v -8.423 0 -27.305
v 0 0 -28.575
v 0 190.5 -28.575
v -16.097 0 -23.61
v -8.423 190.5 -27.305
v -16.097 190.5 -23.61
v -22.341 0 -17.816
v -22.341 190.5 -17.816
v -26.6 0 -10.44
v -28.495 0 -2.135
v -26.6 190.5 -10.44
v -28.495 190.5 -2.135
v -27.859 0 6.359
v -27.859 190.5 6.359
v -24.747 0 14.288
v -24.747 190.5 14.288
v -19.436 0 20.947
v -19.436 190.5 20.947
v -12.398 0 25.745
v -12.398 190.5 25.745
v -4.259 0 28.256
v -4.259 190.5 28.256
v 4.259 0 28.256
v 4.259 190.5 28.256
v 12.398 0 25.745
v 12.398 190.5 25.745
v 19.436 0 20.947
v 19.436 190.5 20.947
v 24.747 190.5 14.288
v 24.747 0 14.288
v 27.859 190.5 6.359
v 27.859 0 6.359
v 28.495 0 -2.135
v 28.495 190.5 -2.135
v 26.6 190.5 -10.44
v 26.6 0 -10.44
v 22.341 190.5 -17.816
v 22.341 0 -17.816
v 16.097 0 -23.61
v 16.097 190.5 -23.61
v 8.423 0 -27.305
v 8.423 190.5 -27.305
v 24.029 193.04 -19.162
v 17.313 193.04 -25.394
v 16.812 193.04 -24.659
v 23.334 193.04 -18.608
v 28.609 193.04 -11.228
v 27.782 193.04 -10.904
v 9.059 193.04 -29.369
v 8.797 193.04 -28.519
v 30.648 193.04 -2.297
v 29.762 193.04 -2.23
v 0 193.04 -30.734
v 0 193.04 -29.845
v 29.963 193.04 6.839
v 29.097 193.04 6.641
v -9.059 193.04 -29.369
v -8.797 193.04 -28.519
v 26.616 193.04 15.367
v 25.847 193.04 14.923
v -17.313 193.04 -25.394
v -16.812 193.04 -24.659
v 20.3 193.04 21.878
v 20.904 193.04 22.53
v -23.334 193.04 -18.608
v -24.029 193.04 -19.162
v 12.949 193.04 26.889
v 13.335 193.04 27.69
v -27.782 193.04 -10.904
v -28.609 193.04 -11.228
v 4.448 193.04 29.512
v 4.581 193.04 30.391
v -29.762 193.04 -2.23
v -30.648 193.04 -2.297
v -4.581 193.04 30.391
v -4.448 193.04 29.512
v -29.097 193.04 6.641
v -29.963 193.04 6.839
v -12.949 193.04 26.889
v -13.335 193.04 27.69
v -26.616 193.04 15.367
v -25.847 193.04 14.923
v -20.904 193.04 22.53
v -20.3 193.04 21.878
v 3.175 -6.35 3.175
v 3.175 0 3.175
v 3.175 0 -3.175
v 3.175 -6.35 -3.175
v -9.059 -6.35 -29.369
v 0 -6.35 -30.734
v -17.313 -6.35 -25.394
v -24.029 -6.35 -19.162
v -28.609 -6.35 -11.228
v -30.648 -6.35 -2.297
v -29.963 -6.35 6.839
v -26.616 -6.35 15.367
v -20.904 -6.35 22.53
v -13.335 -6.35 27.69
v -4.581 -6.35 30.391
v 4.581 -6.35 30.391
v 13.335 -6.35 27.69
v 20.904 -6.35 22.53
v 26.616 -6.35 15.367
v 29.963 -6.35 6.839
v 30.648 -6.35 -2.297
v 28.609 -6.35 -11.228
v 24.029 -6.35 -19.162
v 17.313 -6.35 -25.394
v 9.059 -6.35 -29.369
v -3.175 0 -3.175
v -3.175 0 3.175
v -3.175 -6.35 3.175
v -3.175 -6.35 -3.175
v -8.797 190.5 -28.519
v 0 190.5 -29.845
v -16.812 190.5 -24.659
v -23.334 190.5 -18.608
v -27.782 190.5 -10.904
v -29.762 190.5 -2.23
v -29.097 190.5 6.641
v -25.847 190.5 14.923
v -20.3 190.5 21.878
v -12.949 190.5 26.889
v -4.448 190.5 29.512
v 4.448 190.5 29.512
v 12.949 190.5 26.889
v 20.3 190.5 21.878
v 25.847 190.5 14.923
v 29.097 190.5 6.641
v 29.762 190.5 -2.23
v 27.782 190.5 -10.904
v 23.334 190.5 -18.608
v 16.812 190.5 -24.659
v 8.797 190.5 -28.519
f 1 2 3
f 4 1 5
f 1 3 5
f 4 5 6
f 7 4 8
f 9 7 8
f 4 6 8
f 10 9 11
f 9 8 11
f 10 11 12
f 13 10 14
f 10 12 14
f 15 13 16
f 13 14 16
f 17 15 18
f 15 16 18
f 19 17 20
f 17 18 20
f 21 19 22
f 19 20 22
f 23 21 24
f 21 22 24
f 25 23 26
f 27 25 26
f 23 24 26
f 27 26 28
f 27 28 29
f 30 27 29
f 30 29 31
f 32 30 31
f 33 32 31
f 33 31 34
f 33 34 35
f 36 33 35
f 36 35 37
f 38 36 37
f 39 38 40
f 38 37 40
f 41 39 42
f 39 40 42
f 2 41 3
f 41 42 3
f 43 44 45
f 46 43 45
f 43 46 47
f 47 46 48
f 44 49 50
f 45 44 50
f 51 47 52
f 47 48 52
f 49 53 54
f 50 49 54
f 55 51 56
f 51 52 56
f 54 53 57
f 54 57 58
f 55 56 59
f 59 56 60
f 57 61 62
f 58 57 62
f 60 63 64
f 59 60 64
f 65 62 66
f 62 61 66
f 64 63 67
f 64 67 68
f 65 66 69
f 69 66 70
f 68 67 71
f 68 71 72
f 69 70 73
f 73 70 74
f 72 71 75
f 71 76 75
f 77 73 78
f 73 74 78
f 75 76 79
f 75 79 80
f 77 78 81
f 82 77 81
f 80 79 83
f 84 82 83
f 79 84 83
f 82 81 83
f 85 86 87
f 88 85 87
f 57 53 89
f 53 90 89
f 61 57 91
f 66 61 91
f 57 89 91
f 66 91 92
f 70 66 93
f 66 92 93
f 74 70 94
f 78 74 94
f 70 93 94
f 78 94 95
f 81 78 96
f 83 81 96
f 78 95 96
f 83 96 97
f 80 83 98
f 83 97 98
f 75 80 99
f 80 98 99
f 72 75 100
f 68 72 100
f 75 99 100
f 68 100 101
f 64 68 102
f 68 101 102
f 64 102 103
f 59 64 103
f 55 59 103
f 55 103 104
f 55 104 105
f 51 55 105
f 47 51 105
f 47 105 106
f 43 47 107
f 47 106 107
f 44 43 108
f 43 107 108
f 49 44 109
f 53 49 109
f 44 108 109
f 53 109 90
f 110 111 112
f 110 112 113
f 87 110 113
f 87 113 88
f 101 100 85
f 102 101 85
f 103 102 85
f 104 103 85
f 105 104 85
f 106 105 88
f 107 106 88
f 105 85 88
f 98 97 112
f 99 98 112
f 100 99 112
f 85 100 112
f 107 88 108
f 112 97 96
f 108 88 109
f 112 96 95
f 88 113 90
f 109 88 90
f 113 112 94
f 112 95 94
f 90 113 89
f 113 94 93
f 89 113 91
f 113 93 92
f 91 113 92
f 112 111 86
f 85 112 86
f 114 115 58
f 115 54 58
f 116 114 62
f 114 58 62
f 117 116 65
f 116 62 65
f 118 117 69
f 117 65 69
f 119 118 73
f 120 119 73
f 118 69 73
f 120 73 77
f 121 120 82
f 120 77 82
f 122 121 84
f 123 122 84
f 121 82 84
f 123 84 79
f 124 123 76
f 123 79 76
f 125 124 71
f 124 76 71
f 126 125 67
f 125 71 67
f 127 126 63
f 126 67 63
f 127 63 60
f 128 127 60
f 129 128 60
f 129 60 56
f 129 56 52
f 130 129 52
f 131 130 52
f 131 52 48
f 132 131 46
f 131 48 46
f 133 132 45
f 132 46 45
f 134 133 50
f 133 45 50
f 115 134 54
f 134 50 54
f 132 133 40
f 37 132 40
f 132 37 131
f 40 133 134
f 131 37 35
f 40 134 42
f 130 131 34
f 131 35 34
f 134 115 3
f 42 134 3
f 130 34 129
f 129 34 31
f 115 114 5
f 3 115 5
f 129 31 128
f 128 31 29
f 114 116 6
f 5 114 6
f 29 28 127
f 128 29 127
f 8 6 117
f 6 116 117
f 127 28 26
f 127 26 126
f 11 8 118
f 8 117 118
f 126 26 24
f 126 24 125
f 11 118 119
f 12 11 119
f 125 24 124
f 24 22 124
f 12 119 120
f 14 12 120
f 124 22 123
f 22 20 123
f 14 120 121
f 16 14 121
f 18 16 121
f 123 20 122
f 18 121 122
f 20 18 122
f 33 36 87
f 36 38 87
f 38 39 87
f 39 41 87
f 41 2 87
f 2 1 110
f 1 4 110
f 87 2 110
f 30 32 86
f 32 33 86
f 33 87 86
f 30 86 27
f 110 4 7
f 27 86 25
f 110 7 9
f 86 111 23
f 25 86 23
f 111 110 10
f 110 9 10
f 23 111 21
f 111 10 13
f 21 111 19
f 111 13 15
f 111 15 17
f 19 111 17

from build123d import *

# Parameters (mm, degrees)
SKETCH3_W          = 6.35
SKETCH3_H          = 6.35
CUT_EXTRUDE1_DEPTH = 198.872684098


with BuildPart() as part:
    # Sketch2 → Revolve1 (revolve)
    with BuildSketch(Plane.XY, mode=Mode.PRIVATE) as revolve1_sk:
        Polygon((0, 0), (-28.575, 0), (-28.575, 190.5), (-29.845, 190.5), (-29.845, 193.04), (-30.734, 193.04), (-30.734, -6.35), (0, -6.35), align=None)
    revolve(revolve1_sk.sketch.rotate(Axis((0, -6.35, 0), (0, 1, 0)), 270), axis=Axis((0, -6.35, 0), (0, 1, 0)))

    # Sketch3 → Cut-Extrude1 (cut, through all)
    with BuildSketch(Plane(origin=(0, 0, 0), x_dir=(1, 0, 0), z_dir=(0, 1, 0))):
        Rectangle(SKETCH3_W, SKETCH3_H)
    extrude(amount=-CUT_EXTRUDE1_DEPTH, mode=Mode.SUBTRACT)


solid = part.part
